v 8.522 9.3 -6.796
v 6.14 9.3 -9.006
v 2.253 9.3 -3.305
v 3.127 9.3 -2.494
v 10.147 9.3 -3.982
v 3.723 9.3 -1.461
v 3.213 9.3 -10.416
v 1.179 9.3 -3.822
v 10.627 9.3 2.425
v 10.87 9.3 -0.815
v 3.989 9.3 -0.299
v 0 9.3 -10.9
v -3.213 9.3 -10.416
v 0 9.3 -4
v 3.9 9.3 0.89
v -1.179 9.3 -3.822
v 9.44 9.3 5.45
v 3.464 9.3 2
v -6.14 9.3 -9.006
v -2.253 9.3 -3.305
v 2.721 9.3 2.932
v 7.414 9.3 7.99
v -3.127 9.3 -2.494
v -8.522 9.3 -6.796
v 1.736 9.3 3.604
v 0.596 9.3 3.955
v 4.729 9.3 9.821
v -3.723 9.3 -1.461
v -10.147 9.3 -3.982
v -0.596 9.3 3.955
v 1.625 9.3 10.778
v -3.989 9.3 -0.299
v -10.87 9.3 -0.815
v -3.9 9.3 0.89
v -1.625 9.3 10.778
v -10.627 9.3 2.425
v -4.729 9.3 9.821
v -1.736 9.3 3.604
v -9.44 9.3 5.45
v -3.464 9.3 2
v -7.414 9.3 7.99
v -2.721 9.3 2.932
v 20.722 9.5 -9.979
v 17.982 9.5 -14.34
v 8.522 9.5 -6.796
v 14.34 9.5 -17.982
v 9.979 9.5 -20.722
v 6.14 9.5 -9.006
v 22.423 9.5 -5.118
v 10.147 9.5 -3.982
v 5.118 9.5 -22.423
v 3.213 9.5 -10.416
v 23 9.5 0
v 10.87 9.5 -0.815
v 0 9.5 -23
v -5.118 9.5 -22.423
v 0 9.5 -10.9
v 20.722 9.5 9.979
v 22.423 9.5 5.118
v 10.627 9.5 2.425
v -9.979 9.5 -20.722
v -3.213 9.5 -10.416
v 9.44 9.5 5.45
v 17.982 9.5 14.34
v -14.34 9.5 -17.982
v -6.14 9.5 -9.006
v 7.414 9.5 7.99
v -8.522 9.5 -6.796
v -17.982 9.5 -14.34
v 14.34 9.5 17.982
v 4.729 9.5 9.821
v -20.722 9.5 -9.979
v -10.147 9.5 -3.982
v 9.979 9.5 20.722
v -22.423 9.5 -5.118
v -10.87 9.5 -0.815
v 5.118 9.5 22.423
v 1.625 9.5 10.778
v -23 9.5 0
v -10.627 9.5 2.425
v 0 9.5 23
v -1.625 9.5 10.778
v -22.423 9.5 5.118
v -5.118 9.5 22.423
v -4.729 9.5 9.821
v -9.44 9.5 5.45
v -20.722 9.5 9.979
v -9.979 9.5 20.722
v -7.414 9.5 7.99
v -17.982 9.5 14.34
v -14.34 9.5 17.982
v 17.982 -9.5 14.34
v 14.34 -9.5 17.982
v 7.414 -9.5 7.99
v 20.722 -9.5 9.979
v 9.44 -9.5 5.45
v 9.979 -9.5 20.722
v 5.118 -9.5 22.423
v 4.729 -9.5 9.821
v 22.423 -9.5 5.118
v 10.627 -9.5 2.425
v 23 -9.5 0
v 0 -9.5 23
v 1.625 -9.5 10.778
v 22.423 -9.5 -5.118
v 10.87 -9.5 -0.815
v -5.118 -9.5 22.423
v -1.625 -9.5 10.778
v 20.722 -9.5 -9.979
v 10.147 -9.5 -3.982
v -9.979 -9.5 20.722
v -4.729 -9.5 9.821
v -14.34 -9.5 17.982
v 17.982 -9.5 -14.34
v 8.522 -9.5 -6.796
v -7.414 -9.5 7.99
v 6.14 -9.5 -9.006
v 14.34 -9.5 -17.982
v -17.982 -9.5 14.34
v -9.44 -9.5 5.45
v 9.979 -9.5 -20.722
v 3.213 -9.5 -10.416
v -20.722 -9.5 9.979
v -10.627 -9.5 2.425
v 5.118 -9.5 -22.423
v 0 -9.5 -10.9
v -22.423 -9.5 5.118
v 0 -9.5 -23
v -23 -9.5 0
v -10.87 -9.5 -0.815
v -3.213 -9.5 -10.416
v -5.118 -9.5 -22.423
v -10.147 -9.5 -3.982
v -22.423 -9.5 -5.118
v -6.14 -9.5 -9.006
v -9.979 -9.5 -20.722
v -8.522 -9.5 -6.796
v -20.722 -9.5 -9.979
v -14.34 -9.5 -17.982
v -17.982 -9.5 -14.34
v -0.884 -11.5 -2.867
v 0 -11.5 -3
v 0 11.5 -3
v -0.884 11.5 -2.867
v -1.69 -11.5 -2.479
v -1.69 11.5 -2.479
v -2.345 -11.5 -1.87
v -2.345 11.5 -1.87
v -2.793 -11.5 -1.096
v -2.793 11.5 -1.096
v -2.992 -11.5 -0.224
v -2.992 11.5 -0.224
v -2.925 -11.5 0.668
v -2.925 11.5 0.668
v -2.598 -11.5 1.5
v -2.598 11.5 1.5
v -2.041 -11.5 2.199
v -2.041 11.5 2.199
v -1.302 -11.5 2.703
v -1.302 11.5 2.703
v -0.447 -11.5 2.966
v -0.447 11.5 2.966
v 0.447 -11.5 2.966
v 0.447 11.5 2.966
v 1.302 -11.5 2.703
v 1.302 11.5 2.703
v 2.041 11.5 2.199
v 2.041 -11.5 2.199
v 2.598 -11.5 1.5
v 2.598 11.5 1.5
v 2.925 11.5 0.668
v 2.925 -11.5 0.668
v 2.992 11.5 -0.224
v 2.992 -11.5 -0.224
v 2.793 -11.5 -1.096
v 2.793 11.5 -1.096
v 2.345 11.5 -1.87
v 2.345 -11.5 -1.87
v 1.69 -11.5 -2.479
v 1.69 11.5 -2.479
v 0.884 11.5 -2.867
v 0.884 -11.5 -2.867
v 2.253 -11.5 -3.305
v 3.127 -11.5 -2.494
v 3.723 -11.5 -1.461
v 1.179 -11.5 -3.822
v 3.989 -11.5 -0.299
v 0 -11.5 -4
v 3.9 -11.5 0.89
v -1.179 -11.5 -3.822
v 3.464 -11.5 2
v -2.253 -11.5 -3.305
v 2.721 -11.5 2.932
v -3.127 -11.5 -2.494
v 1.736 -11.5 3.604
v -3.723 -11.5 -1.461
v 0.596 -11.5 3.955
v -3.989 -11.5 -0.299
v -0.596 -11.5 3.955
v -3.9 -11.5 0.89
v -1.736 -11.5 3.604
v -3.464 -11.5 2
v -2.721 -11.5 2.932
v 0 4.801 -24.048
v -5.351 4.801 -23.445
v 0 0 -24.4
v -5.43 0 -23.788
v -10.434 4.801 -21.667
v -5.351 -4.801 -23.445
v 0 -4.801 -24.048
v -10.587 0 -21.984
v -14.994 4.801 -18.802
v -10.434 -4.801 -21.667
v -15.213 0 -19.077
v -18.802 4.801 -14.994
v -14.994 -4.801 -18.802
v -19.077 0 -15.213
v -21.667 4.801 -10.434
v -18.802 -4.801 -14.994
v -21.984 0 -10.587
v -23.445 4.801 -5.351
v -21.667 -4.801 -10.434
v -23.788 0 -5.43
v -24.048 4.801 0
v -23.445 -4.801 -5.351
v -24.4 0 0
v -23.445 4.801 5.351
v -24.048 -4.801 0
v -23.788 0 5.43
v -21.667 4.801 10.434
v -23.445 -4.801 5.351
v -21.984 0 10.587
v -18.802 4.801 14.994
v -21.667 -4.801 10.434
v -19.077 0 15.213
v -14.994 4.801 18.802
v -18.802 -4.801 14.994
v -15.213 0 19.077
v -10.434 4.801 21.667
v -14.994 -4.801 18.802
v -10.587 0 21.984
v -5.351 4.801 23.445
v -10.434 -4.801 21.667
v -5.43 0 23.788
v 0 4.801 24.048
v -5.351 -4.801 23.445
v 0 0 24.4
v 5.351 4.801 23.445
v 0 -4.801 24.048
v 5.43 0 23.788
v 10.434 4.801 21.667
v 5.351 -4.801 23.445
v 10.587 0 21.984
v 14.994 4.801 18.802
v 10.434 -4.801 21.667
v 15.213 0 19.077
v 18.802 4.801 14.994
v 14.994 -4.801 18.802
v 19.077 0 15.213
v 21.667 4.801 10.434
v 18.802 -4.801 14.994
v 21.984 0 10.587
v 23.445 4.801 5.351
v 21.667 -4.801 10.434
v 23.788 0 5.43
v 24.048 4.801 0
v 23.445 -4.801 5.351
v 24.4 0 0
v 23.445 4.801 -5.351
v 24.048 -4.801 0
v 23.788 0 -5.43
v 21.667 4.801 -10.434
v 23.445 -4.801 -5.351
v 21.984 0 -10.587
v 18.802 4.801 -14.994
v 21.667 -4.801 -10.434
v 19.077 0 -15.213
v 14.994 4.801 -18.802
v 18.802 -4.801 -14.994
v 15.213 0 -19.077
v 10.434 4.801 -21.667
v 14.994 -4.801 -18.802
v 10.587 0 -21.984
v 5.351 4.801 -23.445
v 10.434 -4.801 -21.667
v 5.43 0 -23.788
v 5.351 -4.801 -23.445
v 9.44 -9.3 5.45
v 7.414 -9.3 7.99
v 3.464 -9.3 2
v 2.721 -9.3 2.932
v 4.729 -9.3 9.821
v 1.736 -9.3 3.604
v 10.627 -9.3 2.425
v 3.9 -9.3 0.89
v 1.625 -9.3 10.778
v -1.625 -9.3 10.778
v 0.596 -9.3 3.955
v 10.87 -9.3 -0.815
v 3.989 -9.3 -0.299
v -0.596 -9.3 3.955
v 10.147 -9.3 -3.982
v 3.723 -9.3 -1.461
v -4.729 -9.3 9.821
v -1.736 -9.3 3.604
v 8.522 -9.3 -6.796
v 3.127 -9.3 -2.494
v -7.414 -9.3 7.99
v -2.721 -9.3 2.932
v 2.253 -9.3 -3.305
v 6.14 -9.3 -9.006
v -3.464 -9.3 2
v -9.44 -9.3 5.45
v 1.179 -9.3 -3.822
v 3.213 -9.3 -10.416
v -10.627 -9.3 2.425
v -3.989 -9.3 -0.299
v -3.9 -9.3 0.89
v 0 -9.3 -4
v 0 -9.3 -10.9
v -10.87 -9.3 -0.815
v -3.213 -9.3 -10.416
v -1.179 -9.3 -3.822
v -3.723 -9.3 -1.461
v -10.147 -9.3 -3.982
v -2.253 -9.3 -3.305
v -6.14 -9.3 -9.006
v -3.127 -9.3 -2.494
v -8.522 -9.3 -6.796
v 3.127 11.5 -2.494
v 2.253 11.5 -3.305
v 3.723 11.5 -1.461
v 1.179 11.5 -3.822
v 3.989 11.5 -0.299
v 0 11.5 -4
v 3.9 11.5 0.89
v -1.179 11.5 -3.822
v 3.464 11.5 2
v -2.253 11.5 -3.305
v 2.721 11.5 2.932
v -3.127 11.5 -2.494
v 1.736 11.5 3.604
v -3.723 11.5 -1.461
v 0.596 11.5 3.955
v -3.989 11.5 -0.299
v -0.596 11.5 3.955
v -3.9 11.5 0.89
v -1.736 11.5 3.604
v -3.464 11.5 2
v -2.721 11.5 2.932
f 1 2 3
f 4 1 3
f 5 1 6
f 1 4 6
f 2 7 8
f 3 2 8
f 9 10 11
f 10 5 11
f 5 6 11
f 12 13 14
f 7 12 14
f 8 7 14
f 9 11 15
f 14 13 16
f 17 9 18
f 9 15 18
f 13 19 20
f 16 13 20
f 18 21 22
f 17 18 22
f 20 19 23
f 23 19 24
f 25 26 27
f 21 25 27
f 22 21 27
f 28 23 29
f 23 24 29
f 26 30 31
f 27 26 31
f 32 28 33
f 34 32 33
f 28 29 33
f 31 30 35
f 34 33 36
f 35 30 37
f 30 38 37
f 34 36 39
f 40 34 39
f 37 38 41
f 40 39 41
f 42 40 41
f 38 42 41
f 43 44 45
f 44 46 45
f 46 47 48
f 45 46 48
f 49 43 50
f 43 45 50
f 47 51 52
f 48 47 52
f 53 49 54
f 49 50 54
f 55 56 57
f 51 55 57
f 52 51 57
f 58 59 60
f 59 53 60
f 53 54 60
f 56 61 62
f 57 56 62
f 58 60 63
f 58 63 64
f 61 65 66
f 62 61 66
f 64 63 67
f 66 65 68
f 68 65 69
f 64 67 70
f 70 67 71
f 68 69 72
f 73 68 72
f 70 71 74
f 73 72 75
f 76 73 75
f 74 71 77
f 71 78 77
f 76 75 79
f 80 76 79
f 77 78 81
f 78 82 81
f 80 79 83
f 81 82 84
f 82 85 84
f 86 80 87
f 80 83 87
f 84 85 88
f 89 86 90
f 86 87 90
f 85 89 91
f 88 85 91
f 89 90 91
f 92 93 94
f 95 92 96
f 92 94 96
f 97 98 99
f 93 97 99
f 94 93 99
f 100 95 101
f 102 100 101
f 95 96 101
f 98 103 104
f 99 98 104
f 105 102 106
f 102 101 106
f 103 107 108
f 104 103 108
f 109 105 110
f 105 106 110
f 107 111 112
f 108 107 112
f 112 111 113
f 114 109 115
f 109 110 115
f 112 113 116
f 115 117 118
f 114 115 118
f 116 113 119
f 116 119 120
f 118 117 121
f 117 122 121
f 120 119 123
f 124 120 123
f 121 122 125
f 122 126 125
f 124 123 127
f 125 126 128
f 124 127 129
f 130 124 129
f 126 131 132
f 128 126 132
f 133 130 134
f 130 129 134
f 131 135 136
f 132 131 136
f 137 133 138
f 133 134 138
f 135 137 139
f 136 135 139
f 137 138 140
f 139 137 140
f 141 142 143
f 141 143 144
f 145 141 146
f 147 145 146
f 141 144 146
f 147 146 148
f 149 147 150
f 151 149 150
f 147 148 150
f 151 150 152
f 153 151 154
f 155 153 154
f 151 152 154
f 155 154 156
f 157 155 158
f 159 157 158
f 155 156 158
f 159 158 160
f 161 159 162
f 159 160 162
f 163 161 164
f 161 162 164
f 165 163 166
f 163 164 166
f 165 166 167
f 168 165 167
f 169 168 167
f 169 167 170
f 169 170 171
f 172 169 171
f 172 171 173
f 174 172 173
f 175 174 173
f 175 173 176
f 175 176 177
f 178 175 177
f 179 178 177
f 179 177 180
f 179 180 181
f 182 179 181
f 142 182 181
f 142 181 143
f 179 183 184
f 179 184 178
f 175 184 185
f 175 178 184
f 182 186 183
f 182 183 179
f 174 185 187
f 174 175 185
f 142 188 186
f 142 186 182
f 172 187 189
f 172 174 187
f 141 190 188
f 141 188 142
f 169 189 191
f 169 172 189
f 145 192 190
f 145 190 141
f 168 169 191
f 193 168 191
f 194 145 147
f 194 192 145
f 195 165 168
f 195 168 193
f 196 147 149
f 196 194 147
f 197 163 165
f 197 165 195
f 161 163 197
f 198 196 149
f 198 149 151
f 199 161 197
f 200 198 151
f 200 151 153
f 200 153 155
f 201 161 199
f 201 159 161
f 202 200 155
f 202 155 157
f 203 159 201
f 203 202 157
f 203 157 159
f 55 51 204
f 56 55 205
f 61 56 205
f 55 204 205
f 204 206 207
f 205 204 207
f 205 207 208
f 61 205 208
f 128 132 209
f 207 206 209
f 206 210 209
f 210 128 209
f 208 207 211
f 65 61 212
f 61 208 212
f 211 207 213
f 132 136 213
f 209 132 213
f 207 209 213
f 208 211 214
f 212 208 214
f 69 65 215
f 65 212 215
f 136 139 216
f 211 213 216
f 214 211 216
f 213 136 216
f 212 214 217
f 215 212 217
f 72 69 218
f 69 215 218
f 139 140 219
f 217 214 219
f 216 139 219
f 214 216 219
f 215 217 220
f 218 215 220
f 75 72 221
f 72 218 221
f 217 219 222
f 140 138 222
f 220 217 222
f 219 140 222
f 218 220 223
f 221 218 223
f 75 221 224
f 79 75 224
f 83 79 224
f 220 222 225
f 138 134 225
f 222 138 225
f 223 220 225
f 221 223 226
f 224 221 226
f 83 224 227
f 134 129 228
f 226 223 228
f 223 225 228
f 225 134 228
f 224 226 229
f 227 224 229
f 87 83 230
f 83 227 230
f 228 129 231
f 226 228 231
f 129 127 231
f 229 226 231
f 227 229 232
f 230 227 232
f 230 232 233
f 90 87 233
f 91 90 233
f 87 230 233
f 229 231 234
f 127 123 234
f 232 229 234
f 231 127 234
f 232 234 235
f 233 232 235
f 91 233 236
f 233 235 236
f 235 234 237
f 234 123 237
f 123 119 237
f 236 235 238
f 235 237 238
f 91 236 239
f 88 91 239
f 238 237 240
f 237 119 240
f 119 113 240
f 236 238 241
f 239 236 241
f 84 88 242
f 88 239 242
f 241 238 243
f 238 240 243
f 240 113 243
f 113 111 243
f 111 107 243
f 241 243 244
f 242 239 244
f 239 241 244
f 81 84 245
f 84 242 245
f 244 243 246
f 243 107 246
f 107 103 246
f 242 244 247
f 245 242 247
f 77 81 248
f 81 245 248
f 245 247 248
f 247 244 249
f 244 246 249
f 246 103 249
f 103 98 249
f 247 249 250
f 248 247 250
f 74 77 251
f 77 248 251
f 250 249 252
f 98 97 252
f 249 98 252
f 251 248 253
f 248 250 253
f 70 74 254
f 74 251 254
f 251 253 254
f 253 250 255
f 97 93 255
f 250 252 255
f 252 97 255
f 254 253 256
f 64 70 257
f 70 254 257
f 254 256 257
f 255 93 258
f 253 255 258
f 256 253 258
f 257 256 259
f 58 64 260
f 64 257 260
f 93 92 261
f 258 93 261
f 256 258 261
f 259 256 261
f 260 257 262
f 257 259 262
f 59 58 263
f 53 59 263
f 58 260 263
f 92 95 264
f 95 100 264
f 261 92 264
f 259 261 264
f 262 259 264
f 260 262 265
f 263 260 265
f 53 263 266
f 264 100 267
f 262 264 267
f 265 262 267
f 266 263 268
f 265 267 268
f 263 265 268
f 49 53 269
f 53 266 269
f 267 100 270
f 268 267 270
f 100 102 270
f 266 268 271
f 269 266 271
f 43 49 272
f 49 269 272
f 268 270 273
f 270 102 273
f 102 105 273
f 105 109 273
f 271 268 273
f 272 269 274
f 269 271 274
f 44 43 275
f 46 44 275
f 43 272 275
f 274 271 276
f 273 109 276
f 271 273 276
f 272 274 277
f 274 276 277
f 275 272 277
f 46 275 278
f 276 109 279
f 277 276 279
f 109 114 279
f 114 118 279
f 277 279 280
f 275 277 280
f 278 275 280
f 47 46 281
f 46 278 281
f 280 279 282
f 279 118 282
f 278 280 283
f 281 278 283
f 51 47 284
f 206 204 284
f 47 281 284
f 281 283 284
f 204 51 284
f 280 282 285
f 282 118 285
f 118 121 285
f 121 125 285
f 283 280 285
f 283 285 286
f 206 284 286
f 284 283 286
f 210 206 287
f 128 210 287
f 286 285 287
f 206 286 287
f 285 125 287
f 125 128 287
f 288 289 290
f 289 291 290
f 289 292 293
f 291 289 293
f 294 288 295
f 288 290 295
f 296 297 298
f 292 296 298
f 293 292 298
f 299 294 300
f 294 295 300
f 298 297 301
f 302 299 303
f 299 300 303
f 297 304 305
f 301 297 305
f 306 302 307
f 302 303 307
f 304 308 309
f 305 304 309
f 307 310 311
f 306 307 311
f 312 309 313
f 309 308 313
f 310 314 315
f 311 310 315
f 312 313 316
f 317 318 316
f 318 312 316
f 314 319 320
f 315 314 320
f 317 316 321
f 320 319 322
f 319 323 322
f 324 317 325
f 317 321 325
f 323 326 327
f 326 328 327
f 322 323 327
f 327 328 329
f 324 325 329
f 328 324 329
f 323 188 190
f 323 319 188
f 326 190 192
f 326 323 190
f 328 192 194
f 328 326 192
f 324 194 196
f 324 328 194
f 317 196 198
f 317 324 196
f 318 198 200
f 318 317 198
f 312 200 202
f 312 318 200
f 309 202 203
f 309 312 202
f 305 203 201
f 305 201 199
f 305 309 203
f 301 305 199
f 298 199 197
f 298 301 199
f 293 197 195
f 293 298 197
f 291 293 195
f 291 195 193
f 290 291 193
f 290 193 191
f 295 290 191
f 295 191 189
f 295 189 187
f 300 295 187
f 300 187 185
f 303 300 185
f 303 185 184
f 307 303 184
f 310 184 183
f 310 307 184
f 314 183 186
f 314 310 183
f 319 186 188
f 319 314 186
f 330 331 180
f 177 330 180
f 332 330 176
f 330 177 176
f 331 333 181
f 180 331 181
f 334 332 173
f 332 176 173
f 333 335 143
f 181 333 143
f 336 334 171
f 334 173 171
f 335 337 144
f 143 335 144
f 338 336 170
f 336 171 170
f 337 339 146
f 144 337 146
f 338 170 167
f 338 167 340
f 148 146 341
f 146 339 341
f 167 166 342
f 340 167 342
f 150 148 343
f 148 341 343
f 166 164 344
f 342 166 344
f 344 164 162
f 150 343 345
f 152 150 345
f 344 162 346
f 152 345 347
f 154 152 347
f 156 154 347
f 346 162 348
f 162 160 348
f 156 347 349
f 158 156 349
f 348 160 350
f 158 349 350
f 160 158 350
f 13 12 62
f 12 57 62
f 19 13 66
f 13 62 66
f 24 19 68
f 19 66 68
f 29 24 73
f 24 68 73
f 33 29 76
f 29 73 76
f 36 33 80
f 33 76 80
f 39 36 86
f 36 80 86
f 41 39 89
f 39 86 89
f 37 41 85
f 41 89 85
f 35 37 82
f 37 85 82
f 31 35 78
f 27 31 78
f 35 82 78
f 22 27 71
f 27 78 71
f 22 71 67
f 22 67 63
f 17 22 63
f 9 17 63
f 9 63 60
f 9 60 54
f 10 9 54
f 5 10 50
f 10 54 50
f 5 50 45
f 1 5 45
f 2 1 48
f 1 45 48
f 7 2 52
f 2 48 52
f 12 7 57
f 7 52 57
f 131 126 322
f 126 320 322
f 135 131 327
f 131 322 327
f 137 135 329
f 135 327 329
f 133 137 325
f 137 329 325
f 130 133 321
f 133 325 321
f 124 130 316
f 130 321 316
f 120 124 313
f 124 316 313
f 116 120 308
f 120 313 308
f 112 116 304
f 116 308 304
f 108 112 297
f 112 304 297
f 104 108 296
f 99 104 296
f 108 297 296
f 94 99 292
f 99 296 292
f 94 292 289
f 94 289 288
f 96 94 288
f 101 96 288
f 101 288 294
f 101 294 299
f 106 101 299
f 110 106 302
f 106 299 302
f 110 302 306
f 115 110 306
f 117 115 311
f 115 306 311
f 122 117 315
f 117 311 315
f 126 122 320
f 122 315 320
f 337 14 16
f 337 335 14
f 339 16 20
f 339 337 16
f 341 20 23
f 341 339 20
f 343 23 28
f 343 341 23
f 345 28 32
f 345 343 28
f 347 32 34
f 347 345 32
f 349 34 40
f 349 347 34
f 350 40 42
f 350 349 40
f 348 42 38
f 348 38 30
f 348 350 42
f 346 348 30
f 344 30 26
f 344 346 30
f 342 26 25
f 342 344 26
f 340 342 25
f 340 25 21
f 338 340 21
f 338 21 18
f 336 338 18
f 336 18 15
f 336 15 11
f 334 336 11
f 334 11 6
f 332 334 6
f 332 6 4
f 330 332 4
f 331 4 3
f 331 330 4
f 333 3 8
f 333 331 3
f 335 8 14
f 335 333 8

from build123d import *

# Parameters (mm, degrees)
SKETCH2_W = 1
SKETCH2_H = 2.2


with BuildPart() as part:
    # Sketch1 → Revolve1 (revolve)
    with BuildSketch(Plane(origin=(0, 0, 0), x_dir=(0, 0, -1), z_dir=(1, 0, 0))):
        with BuildLine():
            Line((3, -9.3), (3, 9.3))
            Line((3, 9.3), (10.9, 9.3))
            Line((10.9, 9.3), (10.9, 9.5))
            Line((10.9, 9.5), (23, 9.5))
            ThreePointArc((23, 9.5), (24.4, 0), (23, -9.5))
            Line((23, -9.5), (10.9, -9.5))
            Line((10.9, -9.5), (10.9, -9.3))
            Line((10.9, -9.3), (3, -9.3))
        make_face()
    revolve(axis=Axis((0, 0, 0), (0, 1, 0)))

    # Sketch2 → Revolve2 (revolve)
    with BuildSketch(Plane.XY, mode=Mode.PRIVATE) as revolve2_sk:
        with Locations((3.5, 10.4)):
            Rectangle(SKETCH2_W, SKETCH2_H)
        with Locations((3.5, -10.4)):
            Rectangle(SKETCH2_W, SKETCH2_H)
    revolve(revolve2_sk.sketch.rotate(Axis((0, 0, 0), (0, 1, 0)), 90), axis=Axis((0, 0, 0), (0, 1, 0)))


solid = part.part
